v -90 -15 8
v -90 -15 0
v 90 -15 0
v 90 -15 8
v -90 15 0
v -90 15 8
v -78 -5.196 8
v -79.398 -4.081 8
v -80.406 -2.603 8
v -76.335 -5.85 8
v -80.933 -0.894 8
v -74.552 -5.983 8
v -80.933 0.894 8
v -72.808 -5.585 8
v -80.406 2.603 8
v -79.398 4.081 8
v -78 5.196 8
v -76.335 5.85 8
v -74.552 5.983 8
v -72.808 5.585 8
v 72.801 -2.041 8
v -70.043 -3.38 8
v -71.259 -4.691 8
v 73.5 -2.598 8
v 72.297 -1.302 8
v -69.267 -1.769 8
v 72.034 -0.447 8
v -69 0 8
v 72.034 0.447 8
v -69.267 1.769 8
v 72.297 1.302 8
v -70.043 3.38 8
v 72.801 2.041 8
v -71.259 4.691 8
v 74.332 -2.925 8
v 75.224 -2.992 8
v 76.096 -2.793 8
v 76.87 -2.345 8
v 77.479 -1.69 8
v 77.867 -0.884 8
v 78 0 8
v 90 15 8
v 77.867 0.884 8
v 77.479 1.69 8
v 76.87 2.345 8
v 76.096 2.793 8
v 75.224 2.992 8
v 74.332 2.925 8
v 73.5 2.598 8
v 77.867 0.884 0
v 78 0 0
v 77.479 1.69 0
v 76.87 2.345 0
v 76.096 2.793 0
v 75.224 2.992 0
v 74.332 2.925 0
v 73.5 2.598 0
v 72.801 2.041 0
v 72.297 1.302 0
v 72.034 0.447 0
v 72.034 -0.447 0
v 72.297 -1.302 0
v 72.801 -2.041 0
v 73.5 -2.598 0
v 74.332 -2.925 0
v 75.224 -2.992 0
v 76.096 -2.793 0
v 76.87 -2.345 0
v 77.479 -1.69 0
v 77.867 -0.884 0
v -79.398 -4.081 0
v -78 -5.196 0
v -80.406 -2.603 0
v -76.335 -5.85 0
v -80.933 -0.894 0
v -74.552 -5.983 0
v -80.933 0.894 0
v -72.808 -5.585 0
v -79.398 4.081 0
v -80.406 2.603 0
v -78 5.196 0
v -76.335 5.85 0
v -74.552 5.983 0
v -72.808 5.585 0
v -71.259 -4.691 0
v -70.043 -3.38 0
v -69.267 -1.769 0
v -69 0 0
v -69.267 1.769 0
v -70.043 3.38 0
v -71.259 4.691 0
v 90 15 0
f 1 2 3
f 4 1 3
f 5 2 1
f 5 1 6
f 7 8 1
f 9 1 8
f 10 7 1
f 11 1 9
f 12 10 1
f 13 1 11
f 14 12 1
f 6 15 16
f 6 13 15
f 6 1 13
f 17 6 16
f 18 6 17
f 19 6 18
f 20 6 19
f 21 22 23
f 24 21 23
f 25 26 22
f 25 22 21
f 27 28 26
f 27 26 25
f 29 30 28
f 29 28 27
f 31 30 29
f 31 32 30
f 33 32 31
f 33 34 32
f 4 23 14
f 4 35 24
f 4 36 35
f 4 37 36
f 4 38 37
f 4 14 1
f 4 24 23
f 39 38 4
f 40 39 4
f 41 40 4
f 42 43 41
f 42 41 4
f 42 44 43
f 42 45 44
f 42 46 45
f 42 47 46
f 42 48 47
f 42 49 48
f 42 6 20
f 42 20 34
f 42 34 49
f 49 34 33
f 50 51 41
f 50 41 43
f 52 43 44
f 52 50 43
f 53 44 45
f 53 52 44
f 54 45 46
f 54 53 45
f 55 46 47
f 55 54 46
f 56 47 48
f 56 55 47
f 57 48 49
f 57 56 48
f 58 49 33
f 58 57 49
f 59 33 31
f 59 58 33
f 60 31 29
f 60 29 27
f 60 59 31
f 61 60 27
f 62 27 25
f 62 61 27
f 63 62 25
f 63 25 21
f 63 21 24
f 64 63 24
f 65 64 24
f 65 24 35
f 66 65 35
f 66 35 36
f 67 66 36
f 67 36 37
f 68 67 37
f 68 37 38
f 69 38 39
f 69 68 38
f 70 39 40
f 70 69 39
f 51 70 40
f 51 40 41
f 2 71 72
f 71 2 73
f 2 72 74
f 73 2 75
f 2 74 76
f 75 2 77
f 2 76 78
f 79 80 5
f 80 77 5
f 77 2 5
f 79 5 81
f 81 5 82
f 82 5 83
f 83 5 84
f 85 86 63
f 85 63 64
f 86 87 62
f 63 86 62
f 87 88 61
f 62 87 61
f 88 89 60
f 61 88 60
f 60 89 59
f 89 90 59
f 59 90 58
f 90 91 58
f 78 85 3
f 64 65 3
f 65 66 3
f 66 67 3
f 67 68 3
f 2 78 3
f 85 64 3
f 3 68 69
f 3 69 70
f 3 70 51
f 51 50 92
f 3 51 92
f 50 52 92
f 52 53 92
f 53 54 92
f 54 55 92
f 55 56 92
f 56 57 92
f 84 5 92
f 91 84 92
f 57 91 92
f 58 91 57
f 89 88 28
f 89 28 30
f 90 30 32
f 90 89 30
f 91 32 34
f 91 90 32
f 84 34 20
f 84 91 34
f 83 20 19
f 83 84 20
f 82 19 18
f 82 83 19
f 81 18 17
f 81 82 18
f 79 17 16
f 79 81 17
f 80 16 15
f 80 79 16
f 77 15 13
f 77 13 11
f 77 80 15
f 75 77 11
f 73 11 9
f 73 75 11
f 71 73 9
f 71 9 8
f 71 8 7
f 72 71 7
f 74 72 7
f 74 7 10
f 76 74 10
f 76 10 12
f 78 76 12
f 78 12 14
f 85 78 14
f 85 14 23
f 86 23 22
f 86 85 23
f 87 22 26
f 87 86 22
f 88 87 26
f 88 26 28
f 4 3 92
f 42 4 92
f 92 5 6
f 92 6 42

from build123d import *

# Parameters (mm, degrees)
SKETCH_1_W      = 180
SKETCH_1_H      = 30
SKETCH_1_R      = 6
SKETCH_1_R_2    = 3
EXTRUDE_1_DEPTH = 8


with BuildPart() as part:
    # 草图1 → 凸台-拉伸1 (new body)
    with BuildSketch(Plane.XY):
        Rectangle(SKETCH_1_W, SKETCH_1_H)
        with Locations((-75, 0)):
            Circle(SKETCH_1_R, mode=Mode.SUBTRACT)
        with Locations((75, 0)):
            Circle(SKETCH_1_R_2, mode=Mode.SUBTRACT)
    extrude(amount=EXTRUDE_1_DEPTH)


solid = part.part
